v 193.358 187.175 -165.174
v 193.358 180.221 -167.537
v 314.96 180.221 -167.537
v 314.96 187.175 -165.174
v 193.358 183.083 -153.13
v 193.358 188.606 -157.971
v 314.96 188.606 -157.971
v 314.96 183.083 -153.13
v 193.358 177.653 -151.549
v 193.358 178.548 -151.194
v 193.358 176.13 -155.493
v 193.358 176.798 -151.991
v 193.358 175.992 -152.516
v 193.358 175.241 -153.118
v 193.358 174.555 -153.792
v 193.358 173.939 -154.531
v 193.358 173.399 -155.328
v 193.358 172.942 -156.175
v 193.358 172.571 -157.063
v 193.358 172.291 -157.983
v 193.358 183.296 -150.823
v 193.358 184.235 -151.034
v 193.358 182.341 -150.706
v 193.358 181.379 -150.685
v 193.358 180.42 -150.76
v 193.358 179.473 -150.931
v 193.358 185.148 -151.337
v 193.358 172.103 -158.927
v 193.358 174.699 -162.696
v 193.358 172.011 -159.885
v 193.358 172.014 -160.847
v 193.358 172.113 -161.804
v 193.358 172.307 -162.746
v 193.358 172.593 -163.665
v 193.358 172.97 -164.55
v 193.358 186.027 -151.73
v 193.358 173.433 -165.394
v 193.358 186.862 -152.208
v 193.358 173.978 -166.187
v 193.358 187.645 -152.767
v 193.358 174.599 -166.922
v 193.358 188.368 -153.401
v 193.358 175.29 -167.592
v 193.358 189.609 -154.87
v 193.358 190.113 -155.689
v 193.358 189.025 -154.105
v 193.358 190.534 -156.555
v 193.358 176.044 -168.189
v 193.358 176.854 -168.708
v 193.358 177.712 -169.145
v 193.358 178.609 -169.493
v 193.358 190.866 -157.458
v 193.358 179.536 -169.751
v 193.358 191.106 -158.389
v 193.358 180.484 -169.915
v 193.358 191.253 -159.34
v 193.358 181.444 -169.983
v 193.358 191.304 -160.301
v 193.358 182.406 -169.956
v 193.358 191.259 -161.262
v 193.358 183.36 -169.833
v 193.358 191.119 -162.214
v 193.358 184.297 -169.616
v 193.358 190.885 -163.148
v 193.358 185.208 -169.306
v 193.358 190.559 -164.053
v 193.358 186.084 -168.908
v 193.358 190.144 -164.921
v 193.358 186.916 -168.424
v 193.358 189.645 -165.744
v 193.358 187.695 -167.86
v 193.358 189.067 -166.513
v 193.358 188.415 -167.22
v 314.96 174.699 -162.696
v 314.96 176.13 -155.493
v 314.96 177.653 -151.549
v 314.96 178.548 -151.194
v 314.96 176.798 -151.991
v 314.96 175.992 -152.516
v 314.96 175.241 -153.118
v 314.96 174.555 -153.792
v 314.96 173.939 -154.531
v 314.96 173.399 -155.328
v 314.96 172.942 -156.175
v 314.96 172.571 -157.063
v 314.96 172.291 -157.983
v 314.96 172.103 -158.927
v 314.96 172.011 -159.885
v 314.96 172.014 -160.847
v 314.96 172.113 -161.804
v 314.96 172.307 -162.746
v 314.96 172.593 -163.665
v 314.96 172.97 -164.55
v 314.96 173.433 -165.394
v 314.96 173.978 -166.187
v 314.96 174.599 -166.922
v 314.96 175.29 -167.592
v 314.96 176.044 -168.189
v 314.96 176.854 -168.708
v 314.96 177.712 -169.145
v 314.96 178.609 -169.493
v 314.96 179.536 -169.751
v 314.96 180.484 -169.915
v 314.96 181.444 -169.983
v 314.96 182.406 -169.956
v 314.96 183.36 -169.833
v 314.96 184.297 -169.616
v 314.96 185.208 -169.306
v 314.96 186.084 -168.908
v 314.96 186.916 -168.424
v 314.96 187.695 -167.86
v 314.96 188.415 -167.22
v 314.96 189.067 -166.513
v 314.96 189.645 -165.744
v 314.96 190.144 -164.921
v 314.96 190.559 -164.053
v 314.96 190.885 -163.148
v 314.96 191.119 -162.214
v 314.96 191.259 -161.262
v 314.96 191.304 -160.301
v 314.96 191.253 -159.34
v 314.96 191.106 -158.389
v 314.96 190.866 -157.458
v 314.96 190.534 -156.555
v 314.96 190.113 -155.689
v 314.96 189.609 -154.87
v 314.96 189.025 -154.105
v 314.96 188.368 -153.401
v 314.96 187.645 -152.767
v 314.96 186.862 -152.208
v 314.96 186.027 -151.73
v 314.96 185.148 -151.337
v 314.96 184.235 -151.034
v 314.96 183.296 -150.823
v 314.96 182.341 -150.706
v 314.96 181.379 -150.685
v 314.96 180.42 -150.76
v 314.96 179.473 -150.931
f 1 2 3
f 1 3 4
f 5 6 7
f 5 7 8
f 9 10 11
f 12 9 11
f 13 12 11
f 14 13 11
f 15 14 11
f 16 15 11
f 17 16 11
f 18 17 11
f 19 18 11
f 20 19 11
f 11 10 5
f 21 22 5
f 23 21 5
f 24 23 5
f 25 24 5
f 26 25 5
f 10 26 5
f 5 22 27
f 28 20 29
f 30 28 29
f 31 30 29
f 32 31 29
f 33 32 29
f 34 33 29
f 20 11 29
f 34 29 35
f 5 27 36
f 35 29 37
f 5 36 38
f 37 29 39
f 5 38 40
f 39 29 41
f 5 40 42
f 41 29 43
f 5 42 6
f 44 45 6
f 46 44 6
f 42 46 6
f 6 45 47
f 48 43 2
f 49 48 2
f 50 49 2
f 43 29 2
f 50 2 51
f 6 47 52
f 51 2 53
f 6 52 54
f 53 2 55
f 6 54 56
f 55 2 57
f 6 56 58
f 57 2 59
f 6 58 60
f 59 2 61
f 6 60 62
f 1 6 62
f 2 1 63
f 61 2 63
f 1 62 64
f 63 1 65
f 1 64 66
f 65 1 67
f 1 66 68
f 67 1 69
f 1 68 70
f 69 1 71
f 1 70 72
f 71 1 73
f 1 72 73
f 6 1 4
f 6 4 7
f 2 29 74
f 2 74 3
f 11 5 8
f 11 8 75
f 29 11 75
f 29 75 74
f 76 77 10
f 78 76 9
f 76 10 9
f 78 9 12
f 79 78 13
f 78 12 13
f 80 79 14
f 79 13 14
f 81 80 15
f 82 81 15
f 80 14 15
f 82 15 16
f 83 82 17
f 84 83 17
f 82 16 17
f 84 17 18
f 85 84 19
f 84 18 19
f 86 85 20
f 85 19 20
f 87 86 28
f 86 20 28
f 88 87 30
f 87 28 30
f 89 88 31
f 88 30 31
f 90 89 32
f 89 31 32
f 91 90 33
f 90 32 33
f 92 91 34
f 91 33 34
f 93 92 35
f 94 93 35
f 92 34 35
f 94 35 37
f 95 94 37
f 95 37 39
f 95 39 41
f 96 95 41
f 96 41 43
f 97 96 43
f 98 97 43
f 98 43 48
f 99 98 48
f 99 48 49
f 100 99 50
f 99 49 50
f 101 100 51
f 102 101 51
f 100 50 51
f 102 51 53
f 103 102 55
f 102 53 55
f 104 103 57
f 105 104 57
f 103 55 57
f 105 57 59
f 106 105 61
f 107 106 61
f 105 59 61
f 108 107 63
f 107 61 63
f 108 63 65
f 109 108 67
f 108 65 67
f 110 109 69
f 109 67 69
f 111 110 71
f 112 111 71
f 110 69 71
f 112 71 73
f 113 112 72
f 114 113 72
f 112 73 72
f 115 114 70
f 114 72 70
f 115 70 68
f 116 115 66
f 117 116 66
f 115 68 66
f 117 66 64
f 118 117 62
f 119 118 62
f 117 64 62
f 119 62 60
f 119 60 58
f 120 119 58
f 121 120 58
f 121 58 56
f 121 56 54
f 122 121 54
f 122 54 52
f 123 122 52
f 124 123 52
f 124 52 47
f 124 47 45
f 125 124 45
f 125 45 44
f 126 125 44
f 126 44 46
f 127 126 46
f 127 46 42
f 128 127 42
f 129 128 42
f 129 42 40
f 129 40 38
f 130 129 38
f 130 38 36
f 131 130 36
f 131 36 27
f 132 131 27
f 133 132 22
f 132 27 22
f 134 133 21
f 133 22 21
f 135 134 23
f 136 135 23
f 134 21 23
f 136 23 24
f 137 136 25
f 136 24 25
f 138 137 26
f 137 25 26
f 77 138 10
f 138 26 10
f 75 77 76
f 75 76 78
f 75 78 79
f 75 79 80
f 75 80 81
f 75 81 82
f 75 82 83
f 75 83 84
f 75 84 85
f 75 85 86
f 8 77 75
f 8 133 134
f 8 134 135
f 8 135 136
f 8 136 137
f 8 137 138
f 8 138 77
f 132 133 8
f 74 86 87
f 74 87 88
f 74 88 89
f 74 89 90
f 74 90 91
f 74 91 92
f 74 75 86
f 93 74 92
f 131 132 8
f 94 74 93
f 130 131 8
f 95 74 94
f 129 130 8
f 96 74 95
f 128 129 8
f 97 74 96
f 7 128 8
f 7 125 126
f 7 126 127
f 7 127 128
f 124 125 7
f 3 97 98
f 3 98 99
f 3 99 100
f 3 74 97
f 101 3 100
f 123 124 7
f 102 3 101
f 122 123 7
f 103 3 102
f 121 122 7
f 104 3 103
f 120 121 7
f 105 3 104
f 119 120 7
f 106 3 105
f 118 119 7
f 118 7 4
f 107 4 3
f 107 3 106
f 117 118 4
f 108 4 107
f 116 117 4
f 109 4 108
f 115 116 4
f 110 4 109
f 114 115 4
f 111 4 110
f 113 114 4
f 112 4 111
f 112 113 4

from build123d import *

# Parameters (mm, degrees)
BOSS_EXTRUDE1_DEPTH = 121.6025


with BuildPart() as part:
    # Sketch1 → Boss-Extrude1 (new body)
    with BuildSketch(Plane(origin=(193.3575, 0, 0), x_dir=(0, 0, -1), z_dir=(1, 0, 0))):
        with BuildLine():
            ThreePointArc((169.472564712, 184.756731005), (157.228913048, 190.791231973), (151.19441208, 178.547580309))
            ThreePointArc((151.19441208, 178.547580309), (163.438063744, 172.513079341), (169.472564712, 184.756731005))
        make_face()
        Polygon((157.971317168, 188.605783997), (153.130383991, 183.083269536), (155.492555219, 176.129641196), (162.695659624, 174.698527317), (167.536592801, 180.221041778), (165.174421573, 187.174670118), align=None, mode=Mode.SUBTRACT)
    extrude(amount=BOSS_EXTRUDE1_DEPTH)


solid = part.part
